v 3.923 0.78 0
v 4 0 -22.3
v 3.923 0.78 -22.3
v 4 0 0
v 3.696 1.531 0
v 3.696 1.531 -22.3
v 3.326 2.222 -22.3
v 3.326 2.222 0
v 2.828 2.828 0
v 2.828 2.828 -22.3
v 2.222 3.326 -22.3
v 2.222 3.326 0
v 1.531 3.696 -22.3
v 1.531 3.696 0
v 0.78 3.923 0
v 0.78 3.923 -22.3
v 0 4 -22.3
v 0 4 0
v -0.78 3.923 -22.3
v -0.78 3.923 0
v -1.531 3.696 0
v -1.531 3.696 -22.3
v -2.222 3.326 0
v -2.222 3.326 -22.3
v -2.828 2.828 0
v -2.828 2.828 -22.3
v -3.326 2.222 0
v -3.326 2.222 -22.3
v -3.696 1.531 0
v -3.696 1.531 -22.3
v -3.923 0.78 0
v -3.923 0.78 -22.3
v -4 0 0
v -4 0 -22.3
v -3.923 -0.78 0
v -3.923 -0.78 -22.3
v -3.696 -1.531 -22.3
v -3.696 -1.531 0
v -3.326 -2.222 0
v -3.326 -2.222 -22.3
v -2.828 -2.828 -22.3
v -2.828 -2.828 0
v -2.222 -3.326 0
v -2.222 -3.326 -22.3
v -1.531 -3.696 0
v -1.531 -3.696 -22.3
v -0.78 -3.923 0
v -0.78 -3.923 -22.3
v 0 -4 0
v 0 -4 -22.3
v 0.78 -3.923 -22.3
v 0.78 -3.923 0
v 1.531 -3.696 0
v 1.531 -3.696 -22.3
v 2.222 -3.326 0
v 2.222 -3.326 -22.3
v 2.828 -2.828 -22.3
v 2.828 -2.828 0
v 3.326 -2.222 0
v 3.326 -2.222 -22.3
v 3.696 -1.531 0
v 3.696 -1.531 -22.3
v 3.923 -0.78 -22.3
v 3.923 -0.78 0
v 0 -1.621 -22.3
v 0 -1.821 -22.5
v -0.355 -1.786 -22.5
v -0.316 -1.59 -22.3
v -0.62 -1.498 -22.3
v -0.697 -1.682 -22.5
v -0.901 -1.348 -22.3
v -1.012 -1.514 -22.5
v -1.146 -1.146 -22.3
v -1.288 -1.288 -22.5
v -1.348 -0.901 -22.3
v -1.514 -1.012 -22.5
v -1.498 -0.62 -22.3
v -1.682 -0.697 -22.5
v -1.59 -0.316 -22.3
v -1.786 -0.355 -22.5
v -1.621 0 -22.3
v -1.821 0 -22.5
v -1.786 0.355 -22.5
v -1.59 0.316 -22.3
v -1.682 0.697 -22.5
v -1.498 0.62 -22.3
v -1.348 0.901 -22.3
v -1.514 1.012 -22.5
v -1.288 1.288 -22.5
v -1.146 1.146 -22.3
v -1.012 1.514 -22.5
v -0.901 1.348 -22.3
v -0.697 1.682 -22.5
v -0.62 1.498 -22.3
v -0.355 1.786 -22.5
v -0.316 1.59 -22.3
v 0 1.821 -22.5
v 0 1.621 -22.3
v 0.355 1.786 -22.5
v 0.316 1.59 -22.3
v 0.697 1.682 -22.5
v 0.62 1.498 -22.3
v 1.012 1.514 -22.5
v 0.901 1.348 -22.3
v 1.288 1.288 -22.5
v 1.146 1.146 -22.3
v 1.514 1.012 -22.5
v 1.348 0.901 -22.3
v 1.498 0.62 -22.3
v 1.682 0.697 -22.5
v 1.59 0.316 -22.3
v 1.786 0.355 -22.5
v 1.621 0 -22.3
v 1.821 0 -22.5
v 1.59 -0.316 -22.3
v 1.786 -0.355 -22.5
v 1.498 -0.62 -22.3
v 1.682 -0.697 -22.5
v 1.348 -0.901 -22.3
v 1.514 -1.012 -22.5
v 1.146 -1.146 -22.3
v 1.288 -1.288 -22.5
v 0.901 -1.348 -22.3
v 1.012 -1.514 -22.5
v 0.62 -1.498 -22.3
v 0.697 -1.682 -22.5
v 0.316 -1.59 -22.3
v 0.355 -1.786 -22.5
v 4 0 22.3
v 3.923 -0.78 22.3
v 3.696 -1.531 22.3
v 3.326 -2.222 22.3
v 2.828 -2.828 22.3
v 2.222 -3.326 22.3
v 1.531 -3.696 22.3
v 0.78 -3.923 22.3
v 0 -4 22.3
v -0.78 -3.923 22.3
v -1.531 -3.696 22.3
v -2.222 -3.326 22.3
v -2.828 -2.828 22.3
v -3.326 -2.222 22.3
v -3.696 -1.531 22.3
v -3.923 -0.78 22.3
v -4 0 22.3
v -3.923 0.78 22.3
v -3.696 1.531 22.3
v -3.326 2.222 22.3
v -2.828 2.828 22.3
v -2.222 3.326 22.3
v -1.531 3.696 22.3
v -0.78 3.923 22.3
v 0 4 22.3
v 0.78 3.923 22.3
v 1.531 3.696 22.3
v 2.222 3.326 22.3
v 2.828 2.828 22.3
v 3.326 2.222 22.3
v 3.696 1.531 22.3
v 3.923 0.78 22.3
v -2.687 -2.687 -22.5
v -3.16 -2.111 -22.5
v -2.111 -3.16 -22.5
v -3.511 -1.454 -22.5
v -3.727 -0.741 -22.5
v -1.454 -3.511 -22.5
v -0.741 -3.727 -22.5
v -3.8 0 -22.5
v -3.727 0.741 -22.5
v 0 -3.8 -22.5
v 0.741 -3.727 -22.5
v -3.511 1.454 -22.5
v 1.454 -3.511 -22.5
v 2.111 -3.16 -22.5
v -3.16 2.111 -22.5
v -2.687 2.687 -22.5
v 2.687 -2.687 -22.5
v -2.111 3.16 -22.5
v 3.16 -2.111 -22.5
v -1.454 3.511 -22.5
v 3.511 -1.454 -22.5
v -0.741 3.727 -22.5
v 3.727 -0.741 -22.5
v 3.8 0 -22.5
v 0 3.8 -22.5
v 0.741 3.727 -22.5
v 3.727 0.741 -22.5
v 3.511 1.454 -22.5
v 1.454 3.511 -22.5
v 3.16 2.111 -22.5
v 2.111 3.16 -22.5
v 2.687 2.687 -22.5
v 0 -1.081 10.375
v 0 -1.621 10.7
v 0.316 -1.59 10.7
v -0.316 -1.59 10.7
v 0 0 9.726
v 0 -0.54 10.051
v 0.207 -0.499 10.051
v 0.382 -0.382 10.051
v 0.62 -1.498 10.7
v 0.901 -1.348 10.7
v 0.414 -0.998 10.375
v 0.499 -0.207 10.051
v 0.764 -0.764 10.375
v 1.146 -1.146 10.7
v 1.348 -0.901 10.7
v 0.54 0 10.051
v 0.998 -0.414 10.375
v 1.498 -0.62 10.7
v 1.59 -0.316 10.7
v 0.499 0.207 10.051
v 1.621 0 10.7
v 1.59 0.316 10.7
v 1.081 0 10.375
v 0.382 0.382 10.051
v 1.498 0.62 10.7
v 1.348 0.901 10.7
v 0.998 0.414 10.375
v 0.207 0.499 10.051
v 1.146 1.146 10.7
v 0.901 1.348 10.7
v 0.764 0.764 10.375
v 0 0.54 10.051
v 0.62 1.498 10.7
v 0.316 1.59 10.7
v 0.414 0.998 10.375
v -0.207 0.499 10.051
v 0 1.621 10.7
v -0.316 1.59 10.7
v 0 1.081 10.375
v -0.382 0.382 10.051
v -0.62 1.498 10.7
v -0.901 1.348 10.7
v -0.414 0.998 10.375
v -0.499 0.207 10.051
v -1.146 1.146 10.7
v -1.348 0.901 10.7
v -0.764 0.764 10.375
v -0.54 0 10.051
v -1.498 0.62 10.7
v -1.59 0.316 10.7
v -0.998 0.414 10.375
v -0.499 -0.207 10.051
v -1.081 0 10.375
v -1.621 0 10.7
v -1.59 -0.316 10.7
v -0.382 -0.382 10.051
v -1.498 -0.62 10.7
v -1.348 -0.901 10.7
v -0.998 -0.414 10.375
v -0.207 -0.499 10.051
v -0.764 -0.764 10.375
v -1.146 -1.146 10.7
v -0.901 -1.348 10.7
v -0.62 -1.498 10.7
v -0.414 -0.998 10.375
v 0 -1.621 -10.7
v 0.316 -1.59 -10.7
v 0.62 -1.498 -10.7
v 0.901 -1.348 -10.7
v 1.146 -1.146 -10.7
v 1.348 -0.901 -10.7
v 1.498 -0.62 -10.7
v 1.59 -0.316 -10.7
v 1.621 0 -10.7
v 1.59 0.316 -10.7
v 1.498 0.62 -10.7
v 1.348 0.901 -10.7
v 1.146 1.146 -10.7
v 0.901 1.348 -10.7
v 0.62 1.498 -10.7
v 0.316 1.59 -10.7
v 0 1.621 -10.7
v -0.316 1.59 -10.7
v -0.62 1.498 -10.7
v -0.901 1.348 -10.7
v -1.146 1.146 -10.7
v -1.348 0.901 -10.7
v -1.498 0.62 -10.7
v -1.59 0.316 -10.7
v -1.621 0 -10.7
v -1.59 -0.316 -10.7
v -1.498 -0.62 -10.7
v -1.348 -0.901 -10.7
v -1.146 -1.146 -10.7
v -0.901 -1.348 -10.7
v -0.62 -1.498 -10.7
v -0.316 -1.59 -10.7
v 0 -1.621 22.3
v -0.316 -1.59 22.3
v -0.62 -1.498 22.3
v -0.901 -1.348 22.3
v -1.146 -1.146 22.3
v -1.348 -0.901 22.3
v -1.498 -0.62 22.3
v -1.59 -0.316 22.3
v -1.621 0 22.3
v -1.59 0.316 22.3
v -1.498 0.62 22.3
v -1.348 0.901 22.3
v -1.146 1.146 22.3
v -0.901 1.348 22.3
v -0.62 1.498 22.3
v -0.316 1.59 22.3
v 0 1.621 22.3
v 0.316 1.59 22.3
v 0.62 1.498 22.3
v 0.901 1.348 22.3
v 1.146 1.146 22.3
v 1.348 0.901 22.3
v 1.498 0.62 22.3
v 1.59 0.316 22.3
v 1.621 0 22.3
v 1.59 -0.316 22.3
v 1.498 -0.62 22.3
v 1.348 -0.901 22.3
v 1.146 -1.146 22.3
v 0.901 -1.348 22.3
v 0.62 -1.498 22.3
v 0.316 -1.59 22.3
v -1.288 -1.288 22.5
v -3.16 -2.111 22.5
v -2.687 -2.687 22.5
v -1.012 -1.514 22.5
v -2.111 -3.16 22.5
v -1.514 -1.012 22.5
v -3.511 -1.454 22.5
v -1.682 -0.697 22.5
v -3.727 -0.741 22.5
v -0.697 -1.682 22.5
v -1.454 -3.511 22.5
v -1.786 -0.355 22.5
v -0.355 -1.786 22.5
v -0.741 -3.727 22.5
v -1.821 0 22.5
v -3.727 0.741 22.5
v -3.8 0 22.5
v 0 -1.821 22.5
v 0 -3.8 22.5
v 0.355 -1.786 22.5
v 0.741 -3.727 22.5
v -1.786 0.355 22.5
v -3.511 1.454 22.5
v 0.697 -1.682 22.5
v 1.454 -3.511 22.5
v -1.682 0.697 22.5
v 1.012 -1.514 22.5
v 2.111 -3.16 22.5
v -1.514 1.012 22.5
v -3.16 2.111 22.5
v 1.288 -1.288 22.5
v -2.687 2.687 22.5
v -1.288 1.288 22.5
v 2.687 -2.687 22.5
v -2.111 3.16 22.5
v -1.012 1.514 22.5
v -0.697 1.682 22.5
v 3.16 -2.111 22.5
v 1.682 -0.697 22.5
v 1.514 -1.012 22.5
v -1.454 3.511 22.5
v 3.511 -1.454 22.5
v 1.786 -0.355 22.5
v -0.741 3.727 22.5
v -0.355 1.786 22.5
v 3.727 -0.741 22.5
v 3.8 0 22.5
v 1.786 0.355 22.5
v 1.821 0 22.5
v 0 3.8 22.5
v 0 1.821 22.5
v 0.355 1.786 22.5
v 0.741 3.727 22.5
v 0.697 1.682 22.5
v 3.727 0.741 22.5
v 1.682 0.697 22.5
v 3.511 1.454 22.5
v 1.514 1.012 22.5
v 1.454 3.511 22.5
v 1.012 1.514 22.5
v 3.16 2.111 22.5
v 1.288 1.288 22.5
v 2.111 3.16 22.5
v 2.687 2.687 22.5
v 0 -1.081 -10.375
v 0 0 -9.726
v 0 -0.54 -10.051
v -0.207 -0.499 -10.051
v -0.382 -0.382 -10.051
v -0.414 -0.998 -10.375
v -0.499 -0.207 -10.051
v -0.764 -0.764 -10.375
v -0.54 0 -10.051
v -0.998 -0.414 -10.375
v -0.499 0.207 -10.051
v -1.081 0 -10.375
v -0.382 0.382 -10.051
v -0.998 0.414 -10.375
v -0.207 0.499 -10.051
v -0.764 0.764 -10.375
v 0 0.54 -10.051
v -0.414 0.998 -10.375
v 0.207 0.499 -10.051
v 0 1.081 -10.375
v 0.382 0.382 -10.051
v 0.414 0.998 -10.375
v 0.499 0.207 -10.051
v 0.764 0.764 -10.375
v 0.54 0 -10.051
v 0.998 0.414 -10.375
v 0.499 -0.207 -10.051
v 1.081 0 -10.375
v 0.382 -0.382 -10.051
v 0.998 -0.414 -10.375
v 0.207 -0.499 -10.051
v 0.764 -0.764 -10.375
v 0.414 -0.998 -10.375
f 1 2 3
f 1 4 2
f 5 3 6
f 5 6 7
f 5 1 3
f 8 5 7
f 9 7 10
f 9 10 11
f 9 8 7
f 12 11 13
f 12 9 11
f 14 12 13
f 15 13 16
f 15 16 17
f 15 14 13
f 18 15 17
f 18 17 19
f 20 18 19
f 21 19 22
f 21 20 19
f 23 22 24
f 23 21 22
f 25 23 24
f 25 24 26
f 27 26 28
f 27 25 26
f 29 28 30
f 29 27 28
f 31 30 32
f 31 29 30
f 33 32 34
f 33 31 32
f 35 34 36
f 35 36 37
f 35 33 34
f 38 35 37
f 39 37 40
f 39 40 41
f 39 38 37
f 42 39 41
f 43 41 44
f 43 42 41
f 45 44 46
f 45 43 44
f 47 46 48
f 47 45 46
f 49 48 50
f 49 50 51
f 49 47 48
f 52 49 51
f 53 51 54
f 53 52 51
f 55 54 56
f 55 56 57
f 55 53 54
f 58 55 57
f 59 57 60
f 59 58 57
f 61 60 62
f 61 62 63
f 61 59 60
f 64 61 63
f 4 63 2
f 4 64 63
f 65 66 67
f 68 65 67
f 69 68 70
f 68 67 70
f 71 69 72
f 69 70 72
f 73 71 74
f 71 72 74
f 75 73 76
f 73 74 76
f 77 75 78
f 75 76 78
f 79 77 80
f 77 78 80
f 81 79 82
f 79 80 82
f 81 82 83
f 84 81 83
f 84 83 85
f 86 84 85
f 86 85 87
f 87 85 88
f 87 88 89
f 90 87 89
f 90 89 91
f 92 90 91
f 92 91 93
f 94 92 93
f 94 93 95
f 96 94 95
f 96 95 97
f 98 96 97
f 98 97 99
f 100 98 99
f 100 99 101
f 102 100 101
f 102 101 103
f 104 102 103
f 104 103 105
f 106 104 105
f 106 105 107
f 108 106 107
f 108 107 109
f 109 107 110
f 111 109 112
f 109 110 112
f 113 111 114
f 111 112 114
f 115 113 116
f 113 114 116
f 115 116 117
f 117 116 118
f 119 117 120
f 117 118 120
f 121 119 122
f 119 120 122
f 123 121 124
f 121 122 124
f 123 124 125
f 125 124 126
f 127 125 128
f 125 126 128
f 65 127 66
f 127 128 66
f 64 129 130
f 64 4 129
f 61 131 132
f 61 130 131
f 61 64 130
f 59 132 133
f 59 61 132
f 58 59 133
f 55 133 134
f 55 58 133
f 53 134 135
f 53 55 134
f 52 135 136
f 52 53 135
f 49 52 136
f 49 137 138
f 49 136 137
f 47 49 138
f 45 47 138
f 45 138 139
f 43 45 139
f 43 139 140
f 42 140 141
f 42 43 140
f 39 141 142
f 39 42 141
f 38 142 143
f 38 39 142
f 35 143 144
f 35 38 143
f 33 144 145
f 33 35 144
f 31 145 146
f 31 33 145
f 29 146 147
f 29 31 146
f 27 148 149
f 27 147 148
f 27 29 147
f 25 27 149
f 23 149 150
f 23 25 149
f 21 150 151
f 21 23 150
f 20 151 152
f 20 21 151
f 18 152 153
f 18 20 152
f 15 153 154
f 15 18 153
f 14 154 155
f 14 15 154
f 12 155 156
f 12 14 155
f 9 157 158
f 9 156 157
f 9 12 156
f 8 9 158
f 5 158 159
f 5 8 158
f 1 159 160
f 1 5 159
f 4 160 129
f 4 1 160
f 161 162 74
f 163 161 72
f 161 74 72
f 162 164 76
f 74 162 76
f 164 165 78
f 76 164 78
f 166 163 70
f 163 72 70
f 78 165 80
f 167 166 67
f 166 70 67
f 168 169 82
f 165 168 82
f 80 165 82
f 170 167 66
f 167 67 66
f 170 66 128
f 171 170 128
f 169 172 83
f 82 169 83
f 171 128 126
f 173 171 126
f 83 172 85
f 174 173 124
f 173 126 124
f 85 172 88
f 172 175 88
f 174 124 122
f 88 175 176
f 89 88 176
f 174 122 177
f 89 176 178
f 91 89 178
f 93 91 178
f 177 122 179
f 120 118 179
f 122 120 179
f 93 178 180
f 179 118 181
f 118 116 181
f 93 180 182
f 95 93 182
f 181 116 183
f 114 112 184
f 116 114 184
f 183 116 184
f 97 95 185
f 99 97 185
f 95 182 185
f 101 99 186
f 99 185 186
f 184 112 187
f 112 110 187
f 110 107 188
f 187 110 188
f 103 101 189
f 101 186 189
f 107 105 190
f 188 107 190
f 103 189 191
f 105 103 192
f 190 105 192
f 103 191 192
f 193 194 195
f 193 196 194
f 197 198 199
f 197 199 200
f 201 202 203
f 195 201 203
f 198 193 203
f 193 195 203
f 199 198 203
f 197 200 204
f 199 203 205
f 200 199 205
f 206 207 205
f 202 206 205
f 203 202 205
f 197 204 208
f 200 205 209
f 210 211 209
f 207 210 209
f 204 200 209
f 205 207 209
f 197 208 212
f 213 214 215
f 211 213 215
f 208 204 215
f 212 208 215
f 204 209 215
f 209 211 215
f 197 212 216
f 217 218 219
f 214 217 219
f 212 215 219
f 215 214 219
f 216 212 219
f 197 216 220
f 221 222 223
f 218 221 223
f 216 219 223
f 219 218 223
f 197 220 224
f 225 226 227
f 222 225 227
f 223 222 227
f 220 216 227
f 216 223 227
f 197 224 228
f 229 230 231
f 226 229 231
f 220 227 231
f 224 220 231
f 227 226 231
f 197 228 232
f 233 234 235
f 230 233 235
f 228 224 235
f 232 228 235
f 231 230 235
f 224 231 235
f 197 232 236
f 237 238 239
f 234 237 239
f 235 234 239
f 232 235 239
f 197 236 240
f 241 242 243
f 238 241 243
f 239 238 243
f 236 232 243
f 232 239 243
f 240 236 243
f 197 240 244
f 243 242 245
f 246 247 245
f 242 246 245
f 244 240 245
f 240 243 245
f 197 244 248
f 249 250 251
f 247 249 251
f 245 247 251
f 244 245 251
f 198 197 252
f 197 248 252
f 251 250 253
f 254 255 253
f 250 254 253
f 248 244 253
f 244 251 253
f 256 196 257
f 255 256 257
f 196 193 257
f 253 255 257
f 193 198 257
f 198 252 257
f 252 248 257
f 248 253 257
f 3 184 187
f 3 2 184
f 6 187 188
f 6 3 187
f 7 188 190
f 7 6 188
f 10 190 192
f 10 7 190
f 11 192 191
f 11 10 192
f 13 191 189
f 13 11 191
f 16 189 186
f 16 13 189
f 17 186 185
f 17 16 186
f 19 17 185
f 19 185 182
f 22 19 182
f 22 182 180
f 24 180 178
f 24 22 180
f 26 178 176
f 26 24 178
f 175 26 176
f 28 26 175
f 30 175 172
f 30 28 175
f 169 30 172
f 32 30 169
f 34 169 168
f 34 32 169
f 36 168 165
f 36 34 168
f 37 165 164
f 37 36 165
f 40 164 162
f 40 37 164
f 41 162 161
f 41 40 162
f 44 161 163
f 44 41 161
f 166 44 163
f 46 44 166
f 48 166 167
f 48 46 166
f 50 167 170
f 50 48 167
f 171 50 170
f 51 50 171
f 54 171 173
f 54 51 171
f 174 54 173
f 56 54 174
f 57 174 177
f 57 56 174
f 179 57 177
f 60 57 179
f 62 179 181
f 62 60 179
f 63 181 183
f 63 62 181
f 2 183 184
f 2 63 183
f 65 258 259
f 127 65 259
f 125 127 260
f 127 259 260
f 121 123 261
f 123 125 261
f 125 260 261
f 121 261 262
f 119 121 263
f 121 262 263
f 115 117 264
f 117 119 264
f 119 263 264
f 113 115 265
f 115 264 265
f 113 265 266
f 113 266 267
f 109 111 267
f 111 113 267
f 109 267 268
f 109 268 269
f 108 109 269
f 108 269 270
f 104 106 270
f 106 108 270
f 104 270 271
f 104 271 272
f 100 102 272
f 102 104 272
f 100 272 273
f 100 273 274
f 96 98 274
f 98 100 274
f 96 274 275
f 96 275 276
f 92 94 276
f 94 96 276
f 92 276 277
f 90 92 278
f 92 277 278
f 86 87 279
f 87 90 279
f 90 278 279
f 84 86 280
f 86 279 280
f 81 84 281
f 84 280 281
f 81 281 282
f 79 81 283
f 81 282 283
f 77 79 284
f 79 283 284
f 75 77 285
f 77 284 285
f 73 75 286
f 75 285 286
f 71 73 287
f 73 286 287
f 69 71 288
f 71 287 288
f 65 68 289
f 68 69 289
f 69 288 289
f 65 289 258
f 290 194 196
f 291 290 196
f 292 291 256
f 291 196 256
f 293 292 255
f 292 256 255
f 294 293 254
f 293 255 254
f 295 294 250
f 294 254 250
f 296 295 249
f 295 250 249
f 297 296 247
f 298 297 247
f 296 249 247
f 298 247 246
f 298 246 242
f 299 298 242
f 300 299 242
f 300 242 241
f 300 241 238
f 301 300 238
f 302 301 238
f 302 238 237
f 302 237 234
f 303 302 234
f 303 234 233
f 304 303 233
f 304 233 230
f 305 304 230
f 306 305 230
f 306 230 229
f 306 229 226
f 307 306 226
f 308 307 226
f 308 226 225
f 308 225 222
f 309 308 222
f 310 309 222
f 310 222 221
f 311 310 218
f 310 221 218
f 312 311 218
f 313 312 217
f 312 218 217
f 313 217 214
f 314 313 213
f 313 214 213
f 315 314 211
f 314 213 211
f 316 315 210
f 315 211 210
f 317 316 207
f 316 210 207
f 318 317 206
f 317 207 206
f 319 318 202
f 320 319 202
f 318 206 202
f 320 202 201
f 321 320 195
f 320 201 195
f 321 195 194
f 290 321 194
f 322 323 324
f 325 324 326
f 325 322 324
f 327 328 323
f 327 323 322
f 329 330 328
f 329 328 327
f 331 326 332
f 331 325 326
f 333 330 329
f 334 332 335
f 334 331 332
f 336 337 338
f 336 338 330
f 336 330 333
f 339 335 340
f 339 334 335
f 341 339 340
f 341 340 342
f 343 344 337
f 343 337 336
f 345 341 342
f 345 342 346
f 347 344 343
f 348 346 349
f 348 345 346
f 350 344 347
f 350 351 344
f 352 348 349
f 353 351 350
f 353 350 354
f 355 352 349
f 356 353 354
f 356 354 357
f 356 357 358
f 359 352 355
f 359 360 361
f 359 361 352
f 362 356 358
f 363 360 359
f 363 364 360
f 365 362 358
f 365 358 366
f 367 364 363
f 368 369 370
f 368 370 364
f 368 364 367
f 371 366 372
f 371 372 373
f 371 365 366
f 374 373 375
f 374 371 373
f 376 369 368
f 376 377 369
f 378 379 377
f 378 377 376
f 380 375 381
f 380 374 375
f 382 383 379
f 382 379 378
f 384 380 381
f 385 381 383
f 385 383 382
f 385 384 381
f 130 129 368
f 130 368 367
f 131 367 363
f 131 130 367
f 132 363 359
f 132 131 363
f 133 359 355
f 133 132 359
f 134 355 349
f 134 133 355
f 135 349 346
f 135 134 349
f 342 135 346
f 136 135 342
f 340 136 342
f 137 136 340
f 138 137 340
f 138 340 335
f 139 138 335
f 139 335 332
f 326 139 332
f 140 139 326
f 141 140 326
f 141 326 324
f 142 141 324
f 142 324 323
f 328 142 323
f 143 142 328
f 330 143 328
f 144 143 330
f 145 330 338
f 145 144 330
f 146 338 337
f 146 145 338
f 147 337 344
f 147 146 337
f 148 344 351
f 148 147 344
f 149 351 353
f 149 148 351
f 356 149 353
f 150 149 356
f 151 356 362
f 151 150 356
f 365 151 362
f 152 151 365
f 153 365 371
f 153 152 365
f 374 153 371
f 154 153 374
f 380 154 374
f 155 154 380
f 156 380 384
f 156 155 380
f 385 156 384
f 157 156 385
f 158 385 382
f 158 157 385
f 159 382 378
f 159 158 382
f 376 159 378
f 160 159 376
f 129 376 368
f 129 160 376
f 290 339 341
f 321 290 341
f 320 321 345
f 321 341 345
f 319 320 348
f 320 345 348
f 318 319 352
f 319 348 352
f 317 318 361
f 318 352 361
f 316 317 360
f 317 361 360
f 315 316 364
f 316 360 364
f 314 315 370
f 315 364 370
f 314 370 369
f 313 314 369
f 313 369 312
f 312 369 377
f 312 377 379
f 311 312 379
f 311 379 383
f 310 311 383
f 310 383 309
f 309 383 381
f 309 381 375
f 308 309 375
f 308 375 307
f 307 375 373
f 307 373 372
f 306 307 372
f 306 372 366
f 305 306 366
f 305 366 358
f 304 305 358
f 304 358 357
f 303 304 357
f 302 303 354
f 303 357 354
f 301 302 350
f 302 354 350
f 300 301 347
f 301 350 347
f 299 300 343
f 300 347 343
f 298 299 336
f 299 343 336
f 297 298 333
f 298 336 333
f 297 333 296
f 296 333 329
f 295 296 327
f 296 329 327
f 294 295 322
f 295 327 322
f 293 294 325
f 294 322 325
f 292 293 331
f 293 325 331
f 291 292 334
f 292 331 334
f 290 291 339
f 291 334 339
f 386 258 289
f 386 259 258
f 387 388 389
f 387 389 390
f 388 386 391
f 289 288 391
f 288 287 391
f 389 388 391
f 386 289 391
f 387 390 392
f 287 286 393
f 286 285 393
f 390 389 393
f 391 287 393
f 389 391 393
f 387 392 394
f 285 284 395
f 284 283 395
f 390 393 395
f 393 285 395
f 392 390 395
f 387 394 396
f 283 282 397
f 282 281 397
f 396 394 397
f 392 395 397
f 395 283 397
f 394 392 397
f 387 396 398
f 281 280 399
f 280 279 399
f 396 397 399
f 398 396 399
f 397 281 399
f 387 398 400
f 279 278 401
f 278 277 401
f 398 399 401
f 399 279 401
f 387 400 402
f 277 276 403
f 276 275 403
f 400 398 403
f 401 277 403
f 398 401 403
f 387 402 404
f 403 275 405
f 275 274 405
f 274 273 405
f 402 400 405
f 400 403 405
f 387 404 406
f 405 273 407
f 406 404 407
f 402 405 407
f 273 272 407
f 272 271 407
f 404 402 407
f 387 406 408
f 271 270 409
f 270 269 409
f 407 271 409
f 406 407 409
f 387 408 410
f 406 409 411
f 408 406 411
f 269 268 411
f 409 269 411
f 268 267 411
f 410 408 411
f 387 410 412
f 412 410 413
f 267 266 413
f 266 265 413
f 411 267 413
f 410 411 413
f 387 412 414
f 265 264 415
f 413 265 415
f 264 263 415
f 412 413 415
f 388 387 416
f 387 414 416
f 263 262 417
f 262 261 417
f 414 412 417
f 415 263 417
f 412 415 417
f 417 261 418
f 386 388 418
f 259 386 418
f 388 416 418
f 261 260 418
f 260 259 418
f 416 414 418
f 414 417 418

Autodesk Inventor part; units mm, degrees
ref_plane "YZ Plane" through (0, 0, 0) normal (1, 0, 0) x (0, 1, 0)
ref_plane "XZ Plane" through (0, 0, 0) normal (0, 1, 0) x (-1, 0, 0)
ref_plane "XY Plane" through (0, 0, 0) normal (0, 0, 1) x (1, 0, 0)
sketch "スケッチ1" plane through (0, 0, 0) normal (0, 0, 1) x (1, 0, 0)
  circle A0 centre (0, 0) radius 4
  dimension "d13" = 8
extrude "押し出し1" add sketch "スケッチ1" along normal mid plane 45
sketch "スケッチ2" plane through (0, 0, 22.5) normal (0, 0, 1) x (1, 0, 0)
  point P0 (0, 0)
  point P1 (0, 0)
hole "穴1" at (0, 0, 22.5) direction (0, 0, -1) diameter 3.242 depth 11.8 tip angle 118 thread size "M4x0.7" class "6H" standard "ANSI Metric M Profile"
mirror "ミラー1" about plane through (0, 0, 0) normal (0, 0, 1) of "穴1"
chamfer "面取り1" distance 0.2 angle 45 4 edges at (0, 1.621, 22.5) (-4, 0, 22.5) (-4, 0, -22.5) (0, 1.621, -22.5)
properties part number "ARF-445" material "鋼、炭素鋼"
